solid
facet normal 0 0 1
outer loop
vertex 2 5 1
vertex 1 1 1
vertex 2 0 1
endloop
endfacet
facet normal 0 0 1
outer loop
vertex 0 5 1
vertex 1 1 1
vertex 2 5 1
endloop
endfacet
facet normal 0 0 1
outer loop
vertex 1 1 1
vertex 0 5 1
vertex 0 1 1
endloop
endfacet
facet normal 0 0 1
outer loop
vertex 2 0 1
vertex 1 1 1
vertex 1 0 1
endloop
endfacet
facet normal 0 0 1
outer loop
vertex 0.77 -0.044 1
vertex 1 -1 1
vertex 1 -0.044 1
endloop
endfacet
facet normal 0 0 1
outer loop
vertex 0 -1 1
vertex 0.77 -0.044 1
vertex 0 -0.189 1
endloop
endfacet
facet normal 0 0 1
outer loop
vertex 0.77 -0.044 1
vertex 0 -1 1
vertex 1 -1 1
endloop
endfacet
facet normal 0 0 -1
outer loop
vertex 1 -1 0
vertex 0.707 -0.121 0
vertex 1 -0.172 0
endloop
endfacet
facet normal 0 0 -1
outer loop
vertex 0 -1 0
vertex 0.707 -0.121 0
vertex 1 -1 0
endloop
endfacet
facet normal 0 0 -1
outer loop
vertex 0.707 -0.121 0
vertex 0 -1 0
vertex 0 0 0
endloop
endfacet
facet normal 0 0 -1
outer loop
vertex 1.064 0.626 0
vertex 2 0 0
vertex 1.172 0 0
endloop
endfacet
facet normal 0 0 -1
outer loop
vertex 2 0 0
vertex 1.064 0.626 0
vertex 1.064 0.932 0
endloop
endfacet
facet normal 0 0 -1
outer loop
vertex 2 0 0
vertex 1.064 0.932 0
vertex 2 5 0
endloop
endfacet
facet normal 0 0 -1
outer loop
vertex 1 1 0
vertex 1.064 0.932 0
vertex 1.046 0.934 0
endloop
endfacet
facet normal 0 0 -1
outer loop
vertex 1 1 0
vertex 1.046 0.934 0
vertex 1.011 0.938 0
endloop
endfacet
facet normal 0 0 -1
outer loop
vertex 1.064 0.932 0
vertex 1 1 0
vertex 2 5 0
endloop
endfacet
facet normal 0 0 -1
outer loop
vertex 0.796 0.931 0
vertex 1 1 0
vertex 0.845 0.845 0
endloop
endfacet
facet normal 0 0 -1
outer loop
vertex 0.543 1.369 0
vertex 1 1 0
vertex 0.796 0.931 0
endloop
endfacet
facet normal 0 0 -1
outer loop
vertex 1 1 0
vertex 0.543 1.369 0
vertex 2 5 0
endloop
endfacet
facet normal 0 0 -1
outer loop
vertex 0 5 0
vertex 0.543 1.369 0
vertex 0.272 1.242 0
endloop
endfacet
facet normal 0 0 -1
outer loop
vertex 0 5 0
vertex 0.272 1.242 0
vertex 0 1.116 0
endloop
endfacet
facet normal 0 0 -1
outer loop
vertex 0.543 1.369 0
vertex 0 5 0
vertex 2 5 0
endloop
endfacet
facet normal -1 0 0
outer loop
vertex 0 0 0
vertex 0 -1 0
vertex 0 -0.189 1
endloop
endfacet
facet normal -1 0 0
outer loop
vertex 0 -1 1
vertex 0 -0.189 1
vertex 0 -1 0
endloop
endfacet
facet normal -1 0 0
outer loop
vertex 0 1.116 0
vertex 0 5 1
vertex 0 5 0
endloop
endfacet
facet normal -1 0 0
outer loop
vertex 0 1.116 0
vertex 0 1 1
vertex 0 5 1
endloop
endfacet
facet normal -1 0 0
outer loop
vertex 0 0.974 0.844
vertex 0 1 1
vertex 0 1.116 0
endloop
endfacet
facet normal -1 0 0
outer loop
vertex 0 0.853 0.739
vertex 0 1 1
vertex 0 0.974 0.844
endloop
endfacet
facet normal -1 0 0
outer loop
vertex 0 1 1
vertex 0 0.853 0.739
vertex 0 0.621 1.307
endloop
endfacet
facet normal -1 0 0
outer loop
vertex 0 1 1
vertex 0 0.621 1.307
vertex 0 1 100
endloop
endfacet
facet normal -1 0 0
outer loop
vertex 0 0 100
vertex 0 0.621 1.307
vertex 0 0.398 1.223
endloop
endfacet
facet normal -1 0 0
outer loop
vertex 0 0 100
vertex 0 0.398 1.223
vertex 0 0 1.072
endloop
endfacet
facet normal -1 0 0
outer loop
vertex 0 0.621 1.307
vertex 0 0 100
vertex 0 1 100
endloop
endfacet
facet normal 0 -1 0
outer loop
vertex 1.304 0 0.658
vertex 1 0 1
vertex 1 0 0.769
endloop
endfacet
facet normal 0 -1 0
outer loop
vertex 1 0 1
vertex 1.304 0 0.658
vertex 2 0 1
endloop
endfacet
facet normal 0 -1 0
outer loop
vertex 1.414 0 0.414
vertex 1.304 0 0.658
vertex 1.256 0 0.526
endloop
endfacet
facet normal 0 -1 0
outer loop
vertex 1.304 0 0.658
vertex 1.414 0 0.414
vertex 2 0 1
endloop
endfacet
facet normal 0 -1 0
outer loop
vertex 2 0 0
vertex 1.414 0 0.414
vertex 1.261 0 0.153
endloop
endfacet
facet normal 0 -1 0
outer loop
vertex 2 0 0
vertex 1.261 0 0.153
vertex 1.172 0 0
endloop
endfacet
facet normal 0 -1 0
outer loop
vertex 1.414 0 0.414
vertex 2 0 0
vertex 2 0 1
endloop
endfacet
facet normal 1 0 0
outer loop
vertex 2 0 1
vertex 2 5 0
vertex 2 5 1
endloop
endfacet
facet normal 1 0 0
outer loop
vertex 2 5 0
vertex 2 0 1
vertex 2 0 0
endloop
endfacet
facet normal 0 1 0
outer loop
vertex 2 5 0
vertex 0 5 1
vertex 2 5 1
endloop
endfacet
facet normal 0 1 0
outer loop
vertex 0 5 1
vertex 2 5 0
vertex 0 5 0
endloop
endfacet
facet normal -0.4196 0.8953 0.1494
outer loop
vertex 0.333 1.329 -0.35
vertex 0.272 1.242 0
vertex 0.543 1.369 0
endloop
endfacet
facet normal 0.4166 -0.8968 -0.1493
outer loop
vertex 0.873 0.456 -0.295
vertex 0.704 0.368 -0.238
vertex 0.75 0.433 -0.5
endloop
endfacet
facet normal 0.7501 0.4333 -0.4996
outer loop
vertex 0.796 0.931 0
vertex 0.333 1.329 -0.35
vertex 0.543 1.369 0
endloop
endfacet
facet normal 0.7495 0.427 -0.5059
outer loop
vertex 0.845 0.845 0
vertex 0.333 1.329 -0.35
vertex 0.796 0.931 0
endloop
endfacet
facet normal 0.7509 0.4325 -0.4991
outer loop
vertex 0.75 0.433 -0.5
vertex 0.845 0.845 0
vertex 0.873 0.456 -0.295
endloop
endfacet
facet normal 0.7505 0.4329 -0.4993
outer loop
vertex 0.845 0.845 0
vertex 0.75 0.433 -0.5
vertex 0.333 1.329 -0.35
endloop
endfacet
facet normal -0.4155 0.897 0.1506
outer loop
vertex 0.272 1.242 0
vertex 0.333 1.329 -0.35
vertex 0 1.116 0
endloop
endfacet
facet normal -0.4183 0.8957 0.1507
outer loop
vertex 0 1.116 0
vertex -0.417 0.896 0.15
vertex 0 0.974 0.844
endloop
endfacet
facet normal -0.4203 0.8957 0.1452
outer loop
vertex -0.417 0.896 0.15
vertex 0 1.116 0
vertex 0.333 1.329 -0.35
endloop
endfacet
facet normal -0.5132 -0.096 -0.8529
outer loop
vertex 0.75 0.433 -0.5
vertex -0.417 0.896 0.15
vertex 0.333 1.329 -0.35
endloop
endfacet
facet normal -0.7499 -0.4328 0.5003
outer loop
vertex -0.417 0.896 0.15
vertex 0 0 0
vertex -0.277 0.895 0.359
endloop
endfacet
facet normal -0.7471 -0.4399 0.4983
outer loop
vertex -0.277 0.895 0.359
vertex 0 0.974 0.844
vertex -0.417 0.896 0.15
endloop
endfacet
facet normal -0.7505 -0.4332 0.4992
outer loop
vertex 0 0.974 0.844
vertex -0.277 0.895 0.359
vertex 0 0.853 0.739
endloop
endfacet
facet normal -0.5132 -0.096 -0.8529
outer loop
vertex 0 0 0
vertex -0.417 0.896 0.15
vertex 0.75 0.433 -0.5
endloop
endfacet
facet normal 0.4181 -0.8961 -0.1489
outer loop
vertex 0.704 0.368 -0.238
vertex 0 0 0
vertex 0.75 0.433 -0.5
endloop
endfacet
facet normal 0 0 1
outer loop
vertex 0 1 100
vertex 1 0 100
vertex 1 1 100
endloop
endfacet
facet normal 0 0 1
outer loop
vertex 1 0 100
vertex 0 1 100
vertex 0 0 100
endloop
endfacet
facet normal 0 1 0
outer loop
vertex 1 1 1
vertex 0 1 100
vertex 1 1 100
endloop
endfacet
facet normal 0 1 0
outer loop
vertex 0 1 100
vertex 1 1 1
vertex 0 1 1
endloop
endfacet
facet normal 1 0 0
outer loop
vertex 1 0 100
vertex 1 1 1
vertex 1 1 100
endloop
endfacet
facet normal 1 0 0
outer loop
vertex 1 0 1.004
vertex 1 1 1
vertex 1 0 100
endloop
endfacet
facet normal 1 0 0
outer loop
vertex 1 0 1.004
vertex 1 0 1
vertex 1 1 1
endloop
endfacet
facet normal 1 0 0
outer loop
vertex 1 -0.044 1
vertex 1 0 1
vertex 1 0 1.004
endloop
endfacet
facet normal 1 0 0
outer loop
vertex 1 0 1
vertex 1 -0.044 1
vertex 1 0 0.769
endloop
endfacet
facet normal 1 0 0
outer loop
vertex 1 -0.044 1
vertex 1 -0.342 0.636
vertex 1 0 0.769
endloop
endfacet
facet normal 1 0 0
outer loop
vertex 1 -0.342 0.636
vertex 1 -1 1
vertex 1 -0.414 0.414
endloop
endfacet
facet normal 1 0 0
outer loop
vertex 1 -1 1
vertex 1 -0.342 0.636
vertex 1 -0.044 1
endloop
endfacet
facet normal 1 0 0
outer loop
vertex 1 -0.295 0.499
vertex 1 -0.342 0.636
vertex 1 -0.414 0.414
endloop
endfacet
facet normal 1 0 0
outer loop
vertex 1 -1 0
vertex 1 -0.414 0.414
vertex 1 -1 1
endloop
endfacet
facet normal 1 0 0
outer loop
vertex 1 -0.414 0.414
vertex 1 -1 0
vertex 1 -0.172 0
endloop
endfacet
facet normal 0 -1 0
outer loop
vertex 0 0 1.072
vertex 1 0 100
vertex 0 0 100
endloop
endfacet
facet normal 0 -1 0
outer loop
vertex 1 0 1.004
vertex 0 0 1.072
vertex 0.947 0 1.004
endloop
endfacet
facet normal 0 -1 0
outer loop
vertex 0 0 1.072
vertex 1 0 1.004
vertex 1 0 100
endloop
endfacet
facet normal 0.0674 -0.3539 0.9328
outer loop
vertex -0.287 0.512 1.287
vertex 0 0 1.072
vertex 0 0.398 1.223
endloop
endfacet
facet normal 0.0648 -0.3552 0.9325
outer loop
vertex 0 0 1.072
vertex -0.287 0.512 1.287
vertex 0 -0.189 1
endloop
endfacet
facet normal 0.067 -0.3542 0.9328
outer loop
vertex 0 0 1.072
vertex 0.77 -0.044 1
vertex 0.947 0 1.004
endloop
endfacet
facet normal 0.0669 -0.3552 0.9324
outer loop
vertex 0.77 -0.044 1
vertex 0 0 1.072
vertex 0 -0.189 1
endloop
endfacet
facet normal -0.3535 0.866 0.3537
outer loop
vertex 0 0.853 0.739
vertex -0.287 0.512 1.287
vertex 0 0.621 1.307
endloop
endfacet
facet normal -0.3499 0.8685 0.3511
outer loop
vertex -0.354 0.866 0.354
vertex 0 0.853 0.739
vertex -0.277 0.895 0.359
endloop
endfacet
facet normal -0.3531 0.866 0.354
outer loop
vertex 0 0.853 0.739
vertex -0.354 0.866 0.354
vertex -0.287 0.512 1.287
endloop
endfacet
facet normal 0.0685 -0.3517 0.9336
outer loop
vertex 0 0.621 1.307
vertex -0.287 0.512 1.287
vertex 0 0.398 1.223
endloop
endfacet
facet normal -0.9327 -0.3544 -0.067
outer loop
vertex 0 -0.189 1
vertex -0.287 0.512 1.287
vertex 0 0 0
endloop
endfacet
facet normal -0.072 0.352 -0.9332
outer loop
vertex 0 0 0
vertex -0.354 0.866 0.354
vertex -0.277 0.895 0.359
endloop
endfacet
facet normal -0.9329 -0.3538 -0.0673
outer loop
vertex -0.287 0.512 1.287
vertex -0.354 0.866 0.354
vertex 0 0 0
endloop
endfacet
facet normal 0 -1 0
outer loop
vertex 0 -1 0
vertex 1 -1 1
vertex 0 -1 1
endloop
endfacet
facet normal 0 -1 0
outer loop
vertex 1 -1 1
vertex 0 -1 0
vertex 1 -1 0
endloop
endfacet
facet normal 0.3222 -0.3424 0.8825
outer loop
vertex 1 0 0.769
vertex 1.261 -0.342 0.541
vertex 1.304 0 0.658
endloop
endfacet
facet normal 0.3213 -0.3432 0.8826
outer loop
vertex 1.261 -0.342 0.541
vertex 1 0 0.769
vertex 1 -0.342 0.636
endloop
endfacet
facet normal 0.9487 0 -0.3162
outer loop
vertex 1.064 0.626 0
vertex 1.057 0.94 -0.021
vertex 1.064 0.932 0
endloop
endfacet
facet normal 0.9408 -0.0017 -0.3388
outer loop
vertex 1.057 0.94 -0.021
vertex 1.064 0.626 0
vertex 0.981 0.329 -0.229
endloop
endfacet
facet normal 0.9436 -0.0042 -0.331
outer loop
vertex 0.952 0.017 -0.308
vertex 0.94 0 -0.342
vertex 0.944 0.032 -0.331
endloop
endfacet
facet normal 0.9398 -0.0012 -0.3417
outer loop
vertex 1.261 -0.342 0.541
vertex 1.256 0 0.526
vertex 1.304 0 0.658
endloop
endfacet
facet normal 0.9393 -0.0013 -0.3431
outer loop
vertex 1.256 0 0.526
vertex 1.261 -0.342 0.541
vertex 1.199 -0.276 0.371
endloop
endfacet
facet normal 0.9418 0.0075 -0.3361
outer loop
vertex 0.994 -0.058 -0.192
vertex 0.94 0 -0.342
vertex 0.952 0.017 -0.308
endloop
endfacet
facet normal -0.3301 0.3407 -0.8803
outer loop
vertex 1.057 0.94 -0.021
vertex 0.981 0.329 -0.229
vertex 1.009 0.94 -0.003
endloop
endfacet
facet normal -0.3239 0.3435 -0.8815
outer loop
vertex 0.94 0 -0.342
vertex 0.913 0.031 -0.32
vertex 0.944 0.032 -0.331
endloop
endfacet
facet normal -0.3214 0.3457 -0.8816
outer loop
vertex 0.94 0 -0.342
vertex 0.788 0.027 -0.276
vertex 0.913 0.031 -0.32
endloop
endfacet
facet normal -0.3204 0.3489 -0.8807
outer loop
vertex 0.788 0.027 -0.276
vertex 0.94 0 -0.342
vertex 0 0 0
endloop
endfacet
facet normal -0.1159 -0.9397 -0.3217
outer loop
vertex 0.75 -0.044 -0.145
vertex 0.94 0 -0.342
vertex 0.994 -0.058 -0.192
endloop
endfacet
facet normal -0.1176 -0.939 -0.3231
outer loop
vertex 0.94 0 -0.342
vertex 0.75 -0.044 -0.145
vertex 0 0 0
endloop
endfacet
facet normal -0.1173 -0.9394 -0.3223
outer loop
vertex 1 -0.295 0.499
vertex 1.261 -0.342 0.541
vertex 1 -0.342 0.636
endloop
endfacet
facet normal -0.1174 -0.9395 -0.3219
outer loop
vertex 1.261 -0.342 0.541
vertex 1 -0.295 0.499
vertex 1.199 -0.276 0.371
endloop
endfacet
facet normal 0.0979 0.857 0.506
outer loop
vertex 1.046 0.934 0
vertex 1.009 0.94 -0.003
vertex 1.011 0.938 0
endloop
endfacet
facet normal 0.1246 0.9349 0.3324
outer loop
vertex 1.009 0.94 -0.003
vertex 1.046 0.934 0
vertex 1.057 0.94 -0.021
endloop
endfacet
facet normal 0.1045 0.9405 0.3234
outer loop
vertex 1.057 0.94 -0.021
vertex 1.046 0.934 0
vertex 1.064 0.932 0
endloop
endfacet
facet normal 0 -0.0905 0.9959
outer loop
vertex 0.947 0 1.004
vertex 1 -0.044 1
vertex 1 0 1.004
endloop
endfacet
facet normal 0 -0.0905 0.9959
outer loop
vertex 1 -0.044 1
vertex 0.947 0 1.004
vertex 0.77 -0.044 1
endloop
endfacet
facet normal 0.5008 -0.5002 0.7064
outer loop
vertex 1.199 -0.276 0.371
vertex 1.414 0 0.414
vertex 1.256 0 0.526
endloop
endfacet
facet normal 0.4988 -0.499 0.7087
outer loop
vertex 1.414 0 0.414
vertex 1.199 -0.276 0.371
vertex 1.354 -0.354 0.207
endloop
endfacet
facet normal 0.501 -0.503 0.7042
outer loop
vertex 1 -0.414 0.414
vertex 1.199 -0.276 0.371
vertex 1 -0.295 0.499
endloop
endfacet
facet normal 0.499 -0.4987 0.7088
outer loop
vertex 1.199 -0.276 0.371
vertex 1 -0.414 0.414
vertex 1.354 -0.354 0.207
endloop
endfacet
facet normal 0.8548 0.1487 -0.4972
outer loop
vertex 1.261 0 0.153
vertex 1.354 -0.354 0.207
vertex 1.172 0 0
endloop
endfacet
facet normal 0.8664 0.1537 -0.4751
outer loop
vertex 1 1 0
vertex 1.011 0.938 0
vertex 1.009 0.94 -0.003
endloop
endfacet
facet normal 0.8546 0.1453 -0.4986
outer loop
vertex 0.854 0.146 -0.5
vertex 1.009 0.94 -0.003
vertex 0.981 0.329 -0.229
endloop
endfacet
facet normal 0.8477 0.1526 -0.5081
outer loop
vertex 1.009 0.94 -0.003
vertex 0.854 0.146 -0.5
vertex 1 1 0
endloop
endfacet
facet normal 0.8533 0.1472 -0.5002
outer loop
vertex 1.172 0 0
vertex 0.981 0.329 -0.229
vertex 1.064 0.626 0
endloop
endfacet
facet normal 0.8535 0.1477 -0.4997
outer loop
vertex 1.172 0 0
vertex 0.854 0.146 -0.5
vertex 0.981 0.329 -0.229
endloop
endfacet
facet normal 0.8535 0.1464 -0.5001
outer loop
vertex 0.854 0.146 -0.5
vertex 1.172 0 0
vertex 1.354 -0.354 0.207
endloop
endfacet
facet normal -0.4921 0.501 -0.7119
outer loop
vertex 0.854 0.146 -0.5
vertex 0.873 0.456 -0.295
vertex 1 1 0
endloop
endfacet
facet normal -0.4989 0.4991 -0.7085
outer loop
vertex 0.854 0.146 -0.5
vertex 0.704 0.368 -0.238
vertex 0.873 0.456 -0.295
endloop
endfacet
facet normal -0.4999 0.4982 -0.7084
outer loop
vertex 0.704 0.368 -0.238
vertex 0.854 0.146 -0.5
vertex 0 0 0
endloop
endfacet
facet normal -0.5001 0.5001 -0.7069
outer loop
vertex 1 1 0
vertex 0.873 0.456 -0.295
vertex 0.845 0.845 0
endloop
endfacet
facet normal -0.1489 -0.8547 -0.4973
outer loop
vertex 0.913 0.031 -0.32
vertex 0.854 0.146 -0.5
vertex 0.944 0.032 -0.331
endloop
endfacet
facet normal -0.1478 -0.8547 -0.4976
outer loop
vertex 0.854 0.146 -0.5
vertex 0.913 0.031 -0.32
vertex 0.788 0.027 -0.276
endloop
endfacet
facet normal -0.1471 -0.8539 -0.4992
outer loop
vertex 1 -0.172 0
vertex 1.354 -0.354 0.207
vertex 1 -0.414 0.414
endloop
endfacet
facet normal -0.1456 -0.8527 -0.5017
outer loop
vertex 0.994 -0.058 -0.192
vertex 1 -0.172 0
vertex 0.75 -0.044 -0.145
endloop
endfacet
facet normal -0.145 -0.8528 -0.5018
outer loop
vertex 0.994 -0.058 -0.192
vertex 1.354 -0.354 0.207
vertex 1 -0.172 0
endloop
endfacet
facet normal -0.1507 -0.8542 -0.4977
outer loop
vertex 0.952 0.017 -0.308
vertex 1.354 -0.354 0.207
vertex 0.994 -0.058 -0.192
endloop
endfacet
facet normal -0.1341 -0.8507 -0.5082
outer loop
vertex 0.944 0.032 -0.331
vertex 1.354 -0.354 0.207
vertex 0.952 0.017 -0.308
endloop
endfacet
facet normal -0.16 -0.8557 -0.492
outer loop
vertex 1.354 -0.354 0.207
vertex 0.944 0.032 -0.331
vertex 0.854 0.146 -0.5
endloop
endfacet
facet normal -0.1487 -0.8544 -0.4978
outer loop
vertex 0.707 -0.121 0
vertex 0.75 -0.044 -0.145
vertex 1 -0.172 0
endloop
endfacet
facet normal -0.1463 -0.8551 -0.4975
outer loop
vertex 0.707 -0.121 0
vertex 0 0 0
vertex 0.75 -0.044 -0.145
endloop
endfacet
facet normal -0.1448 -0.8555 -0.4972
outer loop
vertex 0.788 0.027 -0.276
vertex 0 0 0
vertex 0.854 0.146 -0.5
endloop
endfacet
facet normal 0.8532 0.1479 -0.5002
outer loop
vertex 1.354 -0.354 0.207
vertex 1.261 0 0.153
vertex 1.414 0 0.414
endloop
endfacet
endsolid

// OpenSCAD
translate([sqrt(-1), 0, 0]) cube(1);
rotate([0, 0, acos(2)]) cube(1);
mirror([0/0, 1, 0]) cube(1);
cube([2, 5, undef]);
scale([2, undef, 3]) cube(1);
rotate([10, undef, 30]) cube(1);
linear_extrude(height=1/0) square(1);
rotate(a=30, v=[1,undef,0]) cube(1);
scale([0/0,1,1]) cube(1);
linear_extrude(height=1, twist=0/0) square(1);
square([3, undef]); square([undef, 2]); translate([1, 2]) cube(); scale([2, 3]) cube(); mirror([0, 1]) cube();
rotate([undef, 20]) cube(); rotate([5]) cube(); rotate(45, [1, 1]) cube(); rotate(1/0) cube();
